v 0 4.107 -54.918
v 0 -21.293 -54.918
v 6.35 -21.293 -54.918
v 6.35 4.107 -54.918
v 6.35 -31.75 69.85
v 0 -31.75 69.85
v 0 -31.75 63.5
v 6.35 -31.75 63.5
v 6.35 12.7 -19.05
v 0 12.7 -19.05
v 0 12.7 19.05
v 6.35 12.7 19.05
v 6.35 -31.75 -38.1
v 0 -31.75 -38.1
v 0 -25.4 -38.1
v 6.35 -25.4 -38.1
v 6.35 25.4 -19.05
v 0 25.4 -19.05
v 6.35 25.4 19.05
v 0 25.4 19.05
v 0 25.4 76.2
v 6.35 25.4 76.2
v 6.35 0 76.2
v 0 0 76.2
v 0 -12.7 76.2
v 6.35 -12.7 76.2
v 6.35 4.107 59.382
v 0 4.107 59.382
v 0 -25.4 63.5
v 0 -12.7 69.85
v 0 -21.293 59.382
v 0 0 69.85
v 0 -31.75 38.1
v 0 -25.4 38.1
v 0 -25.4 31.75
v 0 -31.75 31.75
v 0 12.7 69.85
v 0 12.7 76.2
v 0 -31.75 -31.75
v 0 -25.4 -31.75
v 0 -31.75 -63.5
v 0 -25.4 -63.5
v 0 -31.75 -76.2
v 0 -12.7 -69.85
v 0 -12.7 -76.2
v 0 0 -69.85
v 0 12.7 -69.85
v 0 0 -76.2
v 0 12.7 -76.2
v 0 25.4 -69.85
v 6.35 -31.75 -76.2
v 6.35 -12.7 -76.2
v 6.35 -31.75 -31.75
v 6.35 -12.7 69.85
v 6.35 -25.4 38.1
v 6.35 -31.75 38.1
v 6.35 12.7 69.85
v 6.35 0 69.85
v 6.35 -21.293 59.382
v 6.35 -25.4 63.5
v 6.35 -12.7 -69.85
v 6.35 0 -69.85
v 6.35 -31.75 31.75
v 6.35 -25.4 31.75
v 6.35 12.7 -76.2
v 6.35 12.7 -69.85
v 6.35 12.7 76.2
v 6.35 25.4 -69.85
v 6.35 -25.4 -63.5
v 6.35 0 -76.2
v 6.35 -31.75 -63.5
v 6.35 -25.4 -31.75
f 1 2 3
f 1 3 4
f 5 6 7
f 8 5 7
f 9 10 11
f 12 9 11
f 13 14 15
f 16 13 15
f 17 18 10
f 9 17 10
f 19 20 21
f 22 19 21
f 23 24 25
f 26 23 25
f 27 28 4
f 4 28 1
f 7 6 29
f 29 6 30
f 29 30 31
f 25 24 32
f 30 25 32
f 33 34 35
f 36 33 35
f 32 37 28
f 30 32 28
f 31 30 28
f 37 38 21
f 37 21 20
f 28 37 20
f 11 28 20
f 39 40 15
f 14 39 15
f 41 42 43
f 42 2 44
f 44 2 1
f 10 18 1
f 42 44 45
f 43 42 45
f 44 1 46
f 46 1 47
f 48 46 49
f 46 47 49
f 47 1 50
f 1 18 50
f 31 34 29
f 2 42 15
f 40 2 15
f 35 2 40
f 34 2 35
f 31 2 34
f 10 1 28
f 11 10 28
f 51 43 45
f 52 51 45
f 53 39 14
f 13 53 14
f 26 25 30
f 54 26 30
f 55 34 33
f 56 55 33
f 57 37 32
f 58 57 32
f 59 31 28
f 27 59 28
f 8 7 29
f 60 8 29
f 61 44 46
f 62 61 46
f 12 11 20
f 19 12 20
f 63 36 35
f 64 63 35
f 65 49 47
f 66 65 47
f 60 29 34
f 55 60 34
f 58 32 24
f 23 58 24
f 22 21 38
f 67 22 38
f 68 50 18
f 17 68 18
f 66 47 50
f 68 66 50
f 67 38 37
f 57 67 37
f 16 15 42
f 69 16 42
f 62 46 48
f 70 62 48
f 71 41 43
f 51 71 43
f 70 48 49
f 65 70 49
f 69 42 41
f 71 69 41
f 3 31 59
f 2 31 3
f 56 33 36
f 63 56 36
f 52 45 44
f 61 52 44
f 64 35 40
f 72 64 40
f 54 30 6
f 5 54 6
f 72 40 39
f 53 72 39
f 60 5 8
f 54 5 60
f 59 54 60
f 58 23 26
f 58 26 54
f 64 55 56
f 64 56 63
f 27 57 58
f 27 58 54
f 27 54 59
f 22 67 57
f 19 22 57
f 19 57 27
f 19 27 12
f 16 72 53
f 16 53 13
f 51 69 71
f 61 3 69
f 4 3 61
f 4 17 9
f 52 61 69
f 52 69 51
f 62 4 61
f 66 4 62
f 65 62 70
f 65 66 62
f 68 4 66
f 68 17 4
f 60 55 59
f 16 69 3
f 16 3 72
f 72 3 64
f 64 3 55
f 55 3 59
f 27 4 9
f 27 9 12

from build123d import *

# Parameters (mm, degrees)
SKETCH1_W           = 114.3
SKETCH1_H           = 25.4
BOSS_EXTRUDE1_DEPTH = 6.35
SKETCH1_4_W         = 6.35
SKETCH1_4_H         = 6.35
BOSS_EXTRUDE2_DEPTH = 6.35


with BuildPart() as part:
    # Sketch1 → Boss-Extrude1 (new body)
    with BuildSketch(Plane(origin=(0, 0, 0), x_dir=(0, 0, -1), z_dir=(1, 0, 0))):
        Polygon((-76.2, 25.4), (-76.2, 12.7), (-69.85, 12.7), (-69.85, 0), (-76.2, 0), (-76.2, -12.7), (-69.85, -12.7), (-69.85, -31.75), (-63.5, -31.75), (-63.5, -25.4), (-38.1, -25.4), (-38.1, -31.75), (-31.75, -31.75), (-31.75, -25.4), (31.75, -25.4), (31.75, -31.75), (38.1, -31.75), (38.1, -25.4), (63.5, -25.4), (63.5, -31.75), (69.85, -31.75), (69.85, -25.4), (76.2, -25.4), (76.2, -12.7), (69.85, -12.7), (69.85, 0), (76.2, 0), (76.2, 12.7), (69.85, 12.7), (69.85, 25.4), (19.05, 25.4), (19.05, 12.7), (-19.05, 12.7), (-19.05, 25.4), align=None)
        with Locations((-2.231703523, -8.592794364)):
            Rectangle(SKETCH1_W, SKETCH1_H, mode=Mode.SUBTRACT)
    extrude(amount=BOSS_EXTRUDE1_DEPTH)

    # Sketch1<4> → Boss-Extrude2 (add)
    with BuildSketch(Plane(origin=(0, 0, 0), x_dir=(0, 0, -1), z_dir=(1, 0, 0))):
        with Locations((73.025, -28.575)):
            Rectangle(SKETCH1_4_W, SKETCH1_4_H)
    extrude(amount=BOSS_EXTRUDE2_DEPTH)


solid = part.part
